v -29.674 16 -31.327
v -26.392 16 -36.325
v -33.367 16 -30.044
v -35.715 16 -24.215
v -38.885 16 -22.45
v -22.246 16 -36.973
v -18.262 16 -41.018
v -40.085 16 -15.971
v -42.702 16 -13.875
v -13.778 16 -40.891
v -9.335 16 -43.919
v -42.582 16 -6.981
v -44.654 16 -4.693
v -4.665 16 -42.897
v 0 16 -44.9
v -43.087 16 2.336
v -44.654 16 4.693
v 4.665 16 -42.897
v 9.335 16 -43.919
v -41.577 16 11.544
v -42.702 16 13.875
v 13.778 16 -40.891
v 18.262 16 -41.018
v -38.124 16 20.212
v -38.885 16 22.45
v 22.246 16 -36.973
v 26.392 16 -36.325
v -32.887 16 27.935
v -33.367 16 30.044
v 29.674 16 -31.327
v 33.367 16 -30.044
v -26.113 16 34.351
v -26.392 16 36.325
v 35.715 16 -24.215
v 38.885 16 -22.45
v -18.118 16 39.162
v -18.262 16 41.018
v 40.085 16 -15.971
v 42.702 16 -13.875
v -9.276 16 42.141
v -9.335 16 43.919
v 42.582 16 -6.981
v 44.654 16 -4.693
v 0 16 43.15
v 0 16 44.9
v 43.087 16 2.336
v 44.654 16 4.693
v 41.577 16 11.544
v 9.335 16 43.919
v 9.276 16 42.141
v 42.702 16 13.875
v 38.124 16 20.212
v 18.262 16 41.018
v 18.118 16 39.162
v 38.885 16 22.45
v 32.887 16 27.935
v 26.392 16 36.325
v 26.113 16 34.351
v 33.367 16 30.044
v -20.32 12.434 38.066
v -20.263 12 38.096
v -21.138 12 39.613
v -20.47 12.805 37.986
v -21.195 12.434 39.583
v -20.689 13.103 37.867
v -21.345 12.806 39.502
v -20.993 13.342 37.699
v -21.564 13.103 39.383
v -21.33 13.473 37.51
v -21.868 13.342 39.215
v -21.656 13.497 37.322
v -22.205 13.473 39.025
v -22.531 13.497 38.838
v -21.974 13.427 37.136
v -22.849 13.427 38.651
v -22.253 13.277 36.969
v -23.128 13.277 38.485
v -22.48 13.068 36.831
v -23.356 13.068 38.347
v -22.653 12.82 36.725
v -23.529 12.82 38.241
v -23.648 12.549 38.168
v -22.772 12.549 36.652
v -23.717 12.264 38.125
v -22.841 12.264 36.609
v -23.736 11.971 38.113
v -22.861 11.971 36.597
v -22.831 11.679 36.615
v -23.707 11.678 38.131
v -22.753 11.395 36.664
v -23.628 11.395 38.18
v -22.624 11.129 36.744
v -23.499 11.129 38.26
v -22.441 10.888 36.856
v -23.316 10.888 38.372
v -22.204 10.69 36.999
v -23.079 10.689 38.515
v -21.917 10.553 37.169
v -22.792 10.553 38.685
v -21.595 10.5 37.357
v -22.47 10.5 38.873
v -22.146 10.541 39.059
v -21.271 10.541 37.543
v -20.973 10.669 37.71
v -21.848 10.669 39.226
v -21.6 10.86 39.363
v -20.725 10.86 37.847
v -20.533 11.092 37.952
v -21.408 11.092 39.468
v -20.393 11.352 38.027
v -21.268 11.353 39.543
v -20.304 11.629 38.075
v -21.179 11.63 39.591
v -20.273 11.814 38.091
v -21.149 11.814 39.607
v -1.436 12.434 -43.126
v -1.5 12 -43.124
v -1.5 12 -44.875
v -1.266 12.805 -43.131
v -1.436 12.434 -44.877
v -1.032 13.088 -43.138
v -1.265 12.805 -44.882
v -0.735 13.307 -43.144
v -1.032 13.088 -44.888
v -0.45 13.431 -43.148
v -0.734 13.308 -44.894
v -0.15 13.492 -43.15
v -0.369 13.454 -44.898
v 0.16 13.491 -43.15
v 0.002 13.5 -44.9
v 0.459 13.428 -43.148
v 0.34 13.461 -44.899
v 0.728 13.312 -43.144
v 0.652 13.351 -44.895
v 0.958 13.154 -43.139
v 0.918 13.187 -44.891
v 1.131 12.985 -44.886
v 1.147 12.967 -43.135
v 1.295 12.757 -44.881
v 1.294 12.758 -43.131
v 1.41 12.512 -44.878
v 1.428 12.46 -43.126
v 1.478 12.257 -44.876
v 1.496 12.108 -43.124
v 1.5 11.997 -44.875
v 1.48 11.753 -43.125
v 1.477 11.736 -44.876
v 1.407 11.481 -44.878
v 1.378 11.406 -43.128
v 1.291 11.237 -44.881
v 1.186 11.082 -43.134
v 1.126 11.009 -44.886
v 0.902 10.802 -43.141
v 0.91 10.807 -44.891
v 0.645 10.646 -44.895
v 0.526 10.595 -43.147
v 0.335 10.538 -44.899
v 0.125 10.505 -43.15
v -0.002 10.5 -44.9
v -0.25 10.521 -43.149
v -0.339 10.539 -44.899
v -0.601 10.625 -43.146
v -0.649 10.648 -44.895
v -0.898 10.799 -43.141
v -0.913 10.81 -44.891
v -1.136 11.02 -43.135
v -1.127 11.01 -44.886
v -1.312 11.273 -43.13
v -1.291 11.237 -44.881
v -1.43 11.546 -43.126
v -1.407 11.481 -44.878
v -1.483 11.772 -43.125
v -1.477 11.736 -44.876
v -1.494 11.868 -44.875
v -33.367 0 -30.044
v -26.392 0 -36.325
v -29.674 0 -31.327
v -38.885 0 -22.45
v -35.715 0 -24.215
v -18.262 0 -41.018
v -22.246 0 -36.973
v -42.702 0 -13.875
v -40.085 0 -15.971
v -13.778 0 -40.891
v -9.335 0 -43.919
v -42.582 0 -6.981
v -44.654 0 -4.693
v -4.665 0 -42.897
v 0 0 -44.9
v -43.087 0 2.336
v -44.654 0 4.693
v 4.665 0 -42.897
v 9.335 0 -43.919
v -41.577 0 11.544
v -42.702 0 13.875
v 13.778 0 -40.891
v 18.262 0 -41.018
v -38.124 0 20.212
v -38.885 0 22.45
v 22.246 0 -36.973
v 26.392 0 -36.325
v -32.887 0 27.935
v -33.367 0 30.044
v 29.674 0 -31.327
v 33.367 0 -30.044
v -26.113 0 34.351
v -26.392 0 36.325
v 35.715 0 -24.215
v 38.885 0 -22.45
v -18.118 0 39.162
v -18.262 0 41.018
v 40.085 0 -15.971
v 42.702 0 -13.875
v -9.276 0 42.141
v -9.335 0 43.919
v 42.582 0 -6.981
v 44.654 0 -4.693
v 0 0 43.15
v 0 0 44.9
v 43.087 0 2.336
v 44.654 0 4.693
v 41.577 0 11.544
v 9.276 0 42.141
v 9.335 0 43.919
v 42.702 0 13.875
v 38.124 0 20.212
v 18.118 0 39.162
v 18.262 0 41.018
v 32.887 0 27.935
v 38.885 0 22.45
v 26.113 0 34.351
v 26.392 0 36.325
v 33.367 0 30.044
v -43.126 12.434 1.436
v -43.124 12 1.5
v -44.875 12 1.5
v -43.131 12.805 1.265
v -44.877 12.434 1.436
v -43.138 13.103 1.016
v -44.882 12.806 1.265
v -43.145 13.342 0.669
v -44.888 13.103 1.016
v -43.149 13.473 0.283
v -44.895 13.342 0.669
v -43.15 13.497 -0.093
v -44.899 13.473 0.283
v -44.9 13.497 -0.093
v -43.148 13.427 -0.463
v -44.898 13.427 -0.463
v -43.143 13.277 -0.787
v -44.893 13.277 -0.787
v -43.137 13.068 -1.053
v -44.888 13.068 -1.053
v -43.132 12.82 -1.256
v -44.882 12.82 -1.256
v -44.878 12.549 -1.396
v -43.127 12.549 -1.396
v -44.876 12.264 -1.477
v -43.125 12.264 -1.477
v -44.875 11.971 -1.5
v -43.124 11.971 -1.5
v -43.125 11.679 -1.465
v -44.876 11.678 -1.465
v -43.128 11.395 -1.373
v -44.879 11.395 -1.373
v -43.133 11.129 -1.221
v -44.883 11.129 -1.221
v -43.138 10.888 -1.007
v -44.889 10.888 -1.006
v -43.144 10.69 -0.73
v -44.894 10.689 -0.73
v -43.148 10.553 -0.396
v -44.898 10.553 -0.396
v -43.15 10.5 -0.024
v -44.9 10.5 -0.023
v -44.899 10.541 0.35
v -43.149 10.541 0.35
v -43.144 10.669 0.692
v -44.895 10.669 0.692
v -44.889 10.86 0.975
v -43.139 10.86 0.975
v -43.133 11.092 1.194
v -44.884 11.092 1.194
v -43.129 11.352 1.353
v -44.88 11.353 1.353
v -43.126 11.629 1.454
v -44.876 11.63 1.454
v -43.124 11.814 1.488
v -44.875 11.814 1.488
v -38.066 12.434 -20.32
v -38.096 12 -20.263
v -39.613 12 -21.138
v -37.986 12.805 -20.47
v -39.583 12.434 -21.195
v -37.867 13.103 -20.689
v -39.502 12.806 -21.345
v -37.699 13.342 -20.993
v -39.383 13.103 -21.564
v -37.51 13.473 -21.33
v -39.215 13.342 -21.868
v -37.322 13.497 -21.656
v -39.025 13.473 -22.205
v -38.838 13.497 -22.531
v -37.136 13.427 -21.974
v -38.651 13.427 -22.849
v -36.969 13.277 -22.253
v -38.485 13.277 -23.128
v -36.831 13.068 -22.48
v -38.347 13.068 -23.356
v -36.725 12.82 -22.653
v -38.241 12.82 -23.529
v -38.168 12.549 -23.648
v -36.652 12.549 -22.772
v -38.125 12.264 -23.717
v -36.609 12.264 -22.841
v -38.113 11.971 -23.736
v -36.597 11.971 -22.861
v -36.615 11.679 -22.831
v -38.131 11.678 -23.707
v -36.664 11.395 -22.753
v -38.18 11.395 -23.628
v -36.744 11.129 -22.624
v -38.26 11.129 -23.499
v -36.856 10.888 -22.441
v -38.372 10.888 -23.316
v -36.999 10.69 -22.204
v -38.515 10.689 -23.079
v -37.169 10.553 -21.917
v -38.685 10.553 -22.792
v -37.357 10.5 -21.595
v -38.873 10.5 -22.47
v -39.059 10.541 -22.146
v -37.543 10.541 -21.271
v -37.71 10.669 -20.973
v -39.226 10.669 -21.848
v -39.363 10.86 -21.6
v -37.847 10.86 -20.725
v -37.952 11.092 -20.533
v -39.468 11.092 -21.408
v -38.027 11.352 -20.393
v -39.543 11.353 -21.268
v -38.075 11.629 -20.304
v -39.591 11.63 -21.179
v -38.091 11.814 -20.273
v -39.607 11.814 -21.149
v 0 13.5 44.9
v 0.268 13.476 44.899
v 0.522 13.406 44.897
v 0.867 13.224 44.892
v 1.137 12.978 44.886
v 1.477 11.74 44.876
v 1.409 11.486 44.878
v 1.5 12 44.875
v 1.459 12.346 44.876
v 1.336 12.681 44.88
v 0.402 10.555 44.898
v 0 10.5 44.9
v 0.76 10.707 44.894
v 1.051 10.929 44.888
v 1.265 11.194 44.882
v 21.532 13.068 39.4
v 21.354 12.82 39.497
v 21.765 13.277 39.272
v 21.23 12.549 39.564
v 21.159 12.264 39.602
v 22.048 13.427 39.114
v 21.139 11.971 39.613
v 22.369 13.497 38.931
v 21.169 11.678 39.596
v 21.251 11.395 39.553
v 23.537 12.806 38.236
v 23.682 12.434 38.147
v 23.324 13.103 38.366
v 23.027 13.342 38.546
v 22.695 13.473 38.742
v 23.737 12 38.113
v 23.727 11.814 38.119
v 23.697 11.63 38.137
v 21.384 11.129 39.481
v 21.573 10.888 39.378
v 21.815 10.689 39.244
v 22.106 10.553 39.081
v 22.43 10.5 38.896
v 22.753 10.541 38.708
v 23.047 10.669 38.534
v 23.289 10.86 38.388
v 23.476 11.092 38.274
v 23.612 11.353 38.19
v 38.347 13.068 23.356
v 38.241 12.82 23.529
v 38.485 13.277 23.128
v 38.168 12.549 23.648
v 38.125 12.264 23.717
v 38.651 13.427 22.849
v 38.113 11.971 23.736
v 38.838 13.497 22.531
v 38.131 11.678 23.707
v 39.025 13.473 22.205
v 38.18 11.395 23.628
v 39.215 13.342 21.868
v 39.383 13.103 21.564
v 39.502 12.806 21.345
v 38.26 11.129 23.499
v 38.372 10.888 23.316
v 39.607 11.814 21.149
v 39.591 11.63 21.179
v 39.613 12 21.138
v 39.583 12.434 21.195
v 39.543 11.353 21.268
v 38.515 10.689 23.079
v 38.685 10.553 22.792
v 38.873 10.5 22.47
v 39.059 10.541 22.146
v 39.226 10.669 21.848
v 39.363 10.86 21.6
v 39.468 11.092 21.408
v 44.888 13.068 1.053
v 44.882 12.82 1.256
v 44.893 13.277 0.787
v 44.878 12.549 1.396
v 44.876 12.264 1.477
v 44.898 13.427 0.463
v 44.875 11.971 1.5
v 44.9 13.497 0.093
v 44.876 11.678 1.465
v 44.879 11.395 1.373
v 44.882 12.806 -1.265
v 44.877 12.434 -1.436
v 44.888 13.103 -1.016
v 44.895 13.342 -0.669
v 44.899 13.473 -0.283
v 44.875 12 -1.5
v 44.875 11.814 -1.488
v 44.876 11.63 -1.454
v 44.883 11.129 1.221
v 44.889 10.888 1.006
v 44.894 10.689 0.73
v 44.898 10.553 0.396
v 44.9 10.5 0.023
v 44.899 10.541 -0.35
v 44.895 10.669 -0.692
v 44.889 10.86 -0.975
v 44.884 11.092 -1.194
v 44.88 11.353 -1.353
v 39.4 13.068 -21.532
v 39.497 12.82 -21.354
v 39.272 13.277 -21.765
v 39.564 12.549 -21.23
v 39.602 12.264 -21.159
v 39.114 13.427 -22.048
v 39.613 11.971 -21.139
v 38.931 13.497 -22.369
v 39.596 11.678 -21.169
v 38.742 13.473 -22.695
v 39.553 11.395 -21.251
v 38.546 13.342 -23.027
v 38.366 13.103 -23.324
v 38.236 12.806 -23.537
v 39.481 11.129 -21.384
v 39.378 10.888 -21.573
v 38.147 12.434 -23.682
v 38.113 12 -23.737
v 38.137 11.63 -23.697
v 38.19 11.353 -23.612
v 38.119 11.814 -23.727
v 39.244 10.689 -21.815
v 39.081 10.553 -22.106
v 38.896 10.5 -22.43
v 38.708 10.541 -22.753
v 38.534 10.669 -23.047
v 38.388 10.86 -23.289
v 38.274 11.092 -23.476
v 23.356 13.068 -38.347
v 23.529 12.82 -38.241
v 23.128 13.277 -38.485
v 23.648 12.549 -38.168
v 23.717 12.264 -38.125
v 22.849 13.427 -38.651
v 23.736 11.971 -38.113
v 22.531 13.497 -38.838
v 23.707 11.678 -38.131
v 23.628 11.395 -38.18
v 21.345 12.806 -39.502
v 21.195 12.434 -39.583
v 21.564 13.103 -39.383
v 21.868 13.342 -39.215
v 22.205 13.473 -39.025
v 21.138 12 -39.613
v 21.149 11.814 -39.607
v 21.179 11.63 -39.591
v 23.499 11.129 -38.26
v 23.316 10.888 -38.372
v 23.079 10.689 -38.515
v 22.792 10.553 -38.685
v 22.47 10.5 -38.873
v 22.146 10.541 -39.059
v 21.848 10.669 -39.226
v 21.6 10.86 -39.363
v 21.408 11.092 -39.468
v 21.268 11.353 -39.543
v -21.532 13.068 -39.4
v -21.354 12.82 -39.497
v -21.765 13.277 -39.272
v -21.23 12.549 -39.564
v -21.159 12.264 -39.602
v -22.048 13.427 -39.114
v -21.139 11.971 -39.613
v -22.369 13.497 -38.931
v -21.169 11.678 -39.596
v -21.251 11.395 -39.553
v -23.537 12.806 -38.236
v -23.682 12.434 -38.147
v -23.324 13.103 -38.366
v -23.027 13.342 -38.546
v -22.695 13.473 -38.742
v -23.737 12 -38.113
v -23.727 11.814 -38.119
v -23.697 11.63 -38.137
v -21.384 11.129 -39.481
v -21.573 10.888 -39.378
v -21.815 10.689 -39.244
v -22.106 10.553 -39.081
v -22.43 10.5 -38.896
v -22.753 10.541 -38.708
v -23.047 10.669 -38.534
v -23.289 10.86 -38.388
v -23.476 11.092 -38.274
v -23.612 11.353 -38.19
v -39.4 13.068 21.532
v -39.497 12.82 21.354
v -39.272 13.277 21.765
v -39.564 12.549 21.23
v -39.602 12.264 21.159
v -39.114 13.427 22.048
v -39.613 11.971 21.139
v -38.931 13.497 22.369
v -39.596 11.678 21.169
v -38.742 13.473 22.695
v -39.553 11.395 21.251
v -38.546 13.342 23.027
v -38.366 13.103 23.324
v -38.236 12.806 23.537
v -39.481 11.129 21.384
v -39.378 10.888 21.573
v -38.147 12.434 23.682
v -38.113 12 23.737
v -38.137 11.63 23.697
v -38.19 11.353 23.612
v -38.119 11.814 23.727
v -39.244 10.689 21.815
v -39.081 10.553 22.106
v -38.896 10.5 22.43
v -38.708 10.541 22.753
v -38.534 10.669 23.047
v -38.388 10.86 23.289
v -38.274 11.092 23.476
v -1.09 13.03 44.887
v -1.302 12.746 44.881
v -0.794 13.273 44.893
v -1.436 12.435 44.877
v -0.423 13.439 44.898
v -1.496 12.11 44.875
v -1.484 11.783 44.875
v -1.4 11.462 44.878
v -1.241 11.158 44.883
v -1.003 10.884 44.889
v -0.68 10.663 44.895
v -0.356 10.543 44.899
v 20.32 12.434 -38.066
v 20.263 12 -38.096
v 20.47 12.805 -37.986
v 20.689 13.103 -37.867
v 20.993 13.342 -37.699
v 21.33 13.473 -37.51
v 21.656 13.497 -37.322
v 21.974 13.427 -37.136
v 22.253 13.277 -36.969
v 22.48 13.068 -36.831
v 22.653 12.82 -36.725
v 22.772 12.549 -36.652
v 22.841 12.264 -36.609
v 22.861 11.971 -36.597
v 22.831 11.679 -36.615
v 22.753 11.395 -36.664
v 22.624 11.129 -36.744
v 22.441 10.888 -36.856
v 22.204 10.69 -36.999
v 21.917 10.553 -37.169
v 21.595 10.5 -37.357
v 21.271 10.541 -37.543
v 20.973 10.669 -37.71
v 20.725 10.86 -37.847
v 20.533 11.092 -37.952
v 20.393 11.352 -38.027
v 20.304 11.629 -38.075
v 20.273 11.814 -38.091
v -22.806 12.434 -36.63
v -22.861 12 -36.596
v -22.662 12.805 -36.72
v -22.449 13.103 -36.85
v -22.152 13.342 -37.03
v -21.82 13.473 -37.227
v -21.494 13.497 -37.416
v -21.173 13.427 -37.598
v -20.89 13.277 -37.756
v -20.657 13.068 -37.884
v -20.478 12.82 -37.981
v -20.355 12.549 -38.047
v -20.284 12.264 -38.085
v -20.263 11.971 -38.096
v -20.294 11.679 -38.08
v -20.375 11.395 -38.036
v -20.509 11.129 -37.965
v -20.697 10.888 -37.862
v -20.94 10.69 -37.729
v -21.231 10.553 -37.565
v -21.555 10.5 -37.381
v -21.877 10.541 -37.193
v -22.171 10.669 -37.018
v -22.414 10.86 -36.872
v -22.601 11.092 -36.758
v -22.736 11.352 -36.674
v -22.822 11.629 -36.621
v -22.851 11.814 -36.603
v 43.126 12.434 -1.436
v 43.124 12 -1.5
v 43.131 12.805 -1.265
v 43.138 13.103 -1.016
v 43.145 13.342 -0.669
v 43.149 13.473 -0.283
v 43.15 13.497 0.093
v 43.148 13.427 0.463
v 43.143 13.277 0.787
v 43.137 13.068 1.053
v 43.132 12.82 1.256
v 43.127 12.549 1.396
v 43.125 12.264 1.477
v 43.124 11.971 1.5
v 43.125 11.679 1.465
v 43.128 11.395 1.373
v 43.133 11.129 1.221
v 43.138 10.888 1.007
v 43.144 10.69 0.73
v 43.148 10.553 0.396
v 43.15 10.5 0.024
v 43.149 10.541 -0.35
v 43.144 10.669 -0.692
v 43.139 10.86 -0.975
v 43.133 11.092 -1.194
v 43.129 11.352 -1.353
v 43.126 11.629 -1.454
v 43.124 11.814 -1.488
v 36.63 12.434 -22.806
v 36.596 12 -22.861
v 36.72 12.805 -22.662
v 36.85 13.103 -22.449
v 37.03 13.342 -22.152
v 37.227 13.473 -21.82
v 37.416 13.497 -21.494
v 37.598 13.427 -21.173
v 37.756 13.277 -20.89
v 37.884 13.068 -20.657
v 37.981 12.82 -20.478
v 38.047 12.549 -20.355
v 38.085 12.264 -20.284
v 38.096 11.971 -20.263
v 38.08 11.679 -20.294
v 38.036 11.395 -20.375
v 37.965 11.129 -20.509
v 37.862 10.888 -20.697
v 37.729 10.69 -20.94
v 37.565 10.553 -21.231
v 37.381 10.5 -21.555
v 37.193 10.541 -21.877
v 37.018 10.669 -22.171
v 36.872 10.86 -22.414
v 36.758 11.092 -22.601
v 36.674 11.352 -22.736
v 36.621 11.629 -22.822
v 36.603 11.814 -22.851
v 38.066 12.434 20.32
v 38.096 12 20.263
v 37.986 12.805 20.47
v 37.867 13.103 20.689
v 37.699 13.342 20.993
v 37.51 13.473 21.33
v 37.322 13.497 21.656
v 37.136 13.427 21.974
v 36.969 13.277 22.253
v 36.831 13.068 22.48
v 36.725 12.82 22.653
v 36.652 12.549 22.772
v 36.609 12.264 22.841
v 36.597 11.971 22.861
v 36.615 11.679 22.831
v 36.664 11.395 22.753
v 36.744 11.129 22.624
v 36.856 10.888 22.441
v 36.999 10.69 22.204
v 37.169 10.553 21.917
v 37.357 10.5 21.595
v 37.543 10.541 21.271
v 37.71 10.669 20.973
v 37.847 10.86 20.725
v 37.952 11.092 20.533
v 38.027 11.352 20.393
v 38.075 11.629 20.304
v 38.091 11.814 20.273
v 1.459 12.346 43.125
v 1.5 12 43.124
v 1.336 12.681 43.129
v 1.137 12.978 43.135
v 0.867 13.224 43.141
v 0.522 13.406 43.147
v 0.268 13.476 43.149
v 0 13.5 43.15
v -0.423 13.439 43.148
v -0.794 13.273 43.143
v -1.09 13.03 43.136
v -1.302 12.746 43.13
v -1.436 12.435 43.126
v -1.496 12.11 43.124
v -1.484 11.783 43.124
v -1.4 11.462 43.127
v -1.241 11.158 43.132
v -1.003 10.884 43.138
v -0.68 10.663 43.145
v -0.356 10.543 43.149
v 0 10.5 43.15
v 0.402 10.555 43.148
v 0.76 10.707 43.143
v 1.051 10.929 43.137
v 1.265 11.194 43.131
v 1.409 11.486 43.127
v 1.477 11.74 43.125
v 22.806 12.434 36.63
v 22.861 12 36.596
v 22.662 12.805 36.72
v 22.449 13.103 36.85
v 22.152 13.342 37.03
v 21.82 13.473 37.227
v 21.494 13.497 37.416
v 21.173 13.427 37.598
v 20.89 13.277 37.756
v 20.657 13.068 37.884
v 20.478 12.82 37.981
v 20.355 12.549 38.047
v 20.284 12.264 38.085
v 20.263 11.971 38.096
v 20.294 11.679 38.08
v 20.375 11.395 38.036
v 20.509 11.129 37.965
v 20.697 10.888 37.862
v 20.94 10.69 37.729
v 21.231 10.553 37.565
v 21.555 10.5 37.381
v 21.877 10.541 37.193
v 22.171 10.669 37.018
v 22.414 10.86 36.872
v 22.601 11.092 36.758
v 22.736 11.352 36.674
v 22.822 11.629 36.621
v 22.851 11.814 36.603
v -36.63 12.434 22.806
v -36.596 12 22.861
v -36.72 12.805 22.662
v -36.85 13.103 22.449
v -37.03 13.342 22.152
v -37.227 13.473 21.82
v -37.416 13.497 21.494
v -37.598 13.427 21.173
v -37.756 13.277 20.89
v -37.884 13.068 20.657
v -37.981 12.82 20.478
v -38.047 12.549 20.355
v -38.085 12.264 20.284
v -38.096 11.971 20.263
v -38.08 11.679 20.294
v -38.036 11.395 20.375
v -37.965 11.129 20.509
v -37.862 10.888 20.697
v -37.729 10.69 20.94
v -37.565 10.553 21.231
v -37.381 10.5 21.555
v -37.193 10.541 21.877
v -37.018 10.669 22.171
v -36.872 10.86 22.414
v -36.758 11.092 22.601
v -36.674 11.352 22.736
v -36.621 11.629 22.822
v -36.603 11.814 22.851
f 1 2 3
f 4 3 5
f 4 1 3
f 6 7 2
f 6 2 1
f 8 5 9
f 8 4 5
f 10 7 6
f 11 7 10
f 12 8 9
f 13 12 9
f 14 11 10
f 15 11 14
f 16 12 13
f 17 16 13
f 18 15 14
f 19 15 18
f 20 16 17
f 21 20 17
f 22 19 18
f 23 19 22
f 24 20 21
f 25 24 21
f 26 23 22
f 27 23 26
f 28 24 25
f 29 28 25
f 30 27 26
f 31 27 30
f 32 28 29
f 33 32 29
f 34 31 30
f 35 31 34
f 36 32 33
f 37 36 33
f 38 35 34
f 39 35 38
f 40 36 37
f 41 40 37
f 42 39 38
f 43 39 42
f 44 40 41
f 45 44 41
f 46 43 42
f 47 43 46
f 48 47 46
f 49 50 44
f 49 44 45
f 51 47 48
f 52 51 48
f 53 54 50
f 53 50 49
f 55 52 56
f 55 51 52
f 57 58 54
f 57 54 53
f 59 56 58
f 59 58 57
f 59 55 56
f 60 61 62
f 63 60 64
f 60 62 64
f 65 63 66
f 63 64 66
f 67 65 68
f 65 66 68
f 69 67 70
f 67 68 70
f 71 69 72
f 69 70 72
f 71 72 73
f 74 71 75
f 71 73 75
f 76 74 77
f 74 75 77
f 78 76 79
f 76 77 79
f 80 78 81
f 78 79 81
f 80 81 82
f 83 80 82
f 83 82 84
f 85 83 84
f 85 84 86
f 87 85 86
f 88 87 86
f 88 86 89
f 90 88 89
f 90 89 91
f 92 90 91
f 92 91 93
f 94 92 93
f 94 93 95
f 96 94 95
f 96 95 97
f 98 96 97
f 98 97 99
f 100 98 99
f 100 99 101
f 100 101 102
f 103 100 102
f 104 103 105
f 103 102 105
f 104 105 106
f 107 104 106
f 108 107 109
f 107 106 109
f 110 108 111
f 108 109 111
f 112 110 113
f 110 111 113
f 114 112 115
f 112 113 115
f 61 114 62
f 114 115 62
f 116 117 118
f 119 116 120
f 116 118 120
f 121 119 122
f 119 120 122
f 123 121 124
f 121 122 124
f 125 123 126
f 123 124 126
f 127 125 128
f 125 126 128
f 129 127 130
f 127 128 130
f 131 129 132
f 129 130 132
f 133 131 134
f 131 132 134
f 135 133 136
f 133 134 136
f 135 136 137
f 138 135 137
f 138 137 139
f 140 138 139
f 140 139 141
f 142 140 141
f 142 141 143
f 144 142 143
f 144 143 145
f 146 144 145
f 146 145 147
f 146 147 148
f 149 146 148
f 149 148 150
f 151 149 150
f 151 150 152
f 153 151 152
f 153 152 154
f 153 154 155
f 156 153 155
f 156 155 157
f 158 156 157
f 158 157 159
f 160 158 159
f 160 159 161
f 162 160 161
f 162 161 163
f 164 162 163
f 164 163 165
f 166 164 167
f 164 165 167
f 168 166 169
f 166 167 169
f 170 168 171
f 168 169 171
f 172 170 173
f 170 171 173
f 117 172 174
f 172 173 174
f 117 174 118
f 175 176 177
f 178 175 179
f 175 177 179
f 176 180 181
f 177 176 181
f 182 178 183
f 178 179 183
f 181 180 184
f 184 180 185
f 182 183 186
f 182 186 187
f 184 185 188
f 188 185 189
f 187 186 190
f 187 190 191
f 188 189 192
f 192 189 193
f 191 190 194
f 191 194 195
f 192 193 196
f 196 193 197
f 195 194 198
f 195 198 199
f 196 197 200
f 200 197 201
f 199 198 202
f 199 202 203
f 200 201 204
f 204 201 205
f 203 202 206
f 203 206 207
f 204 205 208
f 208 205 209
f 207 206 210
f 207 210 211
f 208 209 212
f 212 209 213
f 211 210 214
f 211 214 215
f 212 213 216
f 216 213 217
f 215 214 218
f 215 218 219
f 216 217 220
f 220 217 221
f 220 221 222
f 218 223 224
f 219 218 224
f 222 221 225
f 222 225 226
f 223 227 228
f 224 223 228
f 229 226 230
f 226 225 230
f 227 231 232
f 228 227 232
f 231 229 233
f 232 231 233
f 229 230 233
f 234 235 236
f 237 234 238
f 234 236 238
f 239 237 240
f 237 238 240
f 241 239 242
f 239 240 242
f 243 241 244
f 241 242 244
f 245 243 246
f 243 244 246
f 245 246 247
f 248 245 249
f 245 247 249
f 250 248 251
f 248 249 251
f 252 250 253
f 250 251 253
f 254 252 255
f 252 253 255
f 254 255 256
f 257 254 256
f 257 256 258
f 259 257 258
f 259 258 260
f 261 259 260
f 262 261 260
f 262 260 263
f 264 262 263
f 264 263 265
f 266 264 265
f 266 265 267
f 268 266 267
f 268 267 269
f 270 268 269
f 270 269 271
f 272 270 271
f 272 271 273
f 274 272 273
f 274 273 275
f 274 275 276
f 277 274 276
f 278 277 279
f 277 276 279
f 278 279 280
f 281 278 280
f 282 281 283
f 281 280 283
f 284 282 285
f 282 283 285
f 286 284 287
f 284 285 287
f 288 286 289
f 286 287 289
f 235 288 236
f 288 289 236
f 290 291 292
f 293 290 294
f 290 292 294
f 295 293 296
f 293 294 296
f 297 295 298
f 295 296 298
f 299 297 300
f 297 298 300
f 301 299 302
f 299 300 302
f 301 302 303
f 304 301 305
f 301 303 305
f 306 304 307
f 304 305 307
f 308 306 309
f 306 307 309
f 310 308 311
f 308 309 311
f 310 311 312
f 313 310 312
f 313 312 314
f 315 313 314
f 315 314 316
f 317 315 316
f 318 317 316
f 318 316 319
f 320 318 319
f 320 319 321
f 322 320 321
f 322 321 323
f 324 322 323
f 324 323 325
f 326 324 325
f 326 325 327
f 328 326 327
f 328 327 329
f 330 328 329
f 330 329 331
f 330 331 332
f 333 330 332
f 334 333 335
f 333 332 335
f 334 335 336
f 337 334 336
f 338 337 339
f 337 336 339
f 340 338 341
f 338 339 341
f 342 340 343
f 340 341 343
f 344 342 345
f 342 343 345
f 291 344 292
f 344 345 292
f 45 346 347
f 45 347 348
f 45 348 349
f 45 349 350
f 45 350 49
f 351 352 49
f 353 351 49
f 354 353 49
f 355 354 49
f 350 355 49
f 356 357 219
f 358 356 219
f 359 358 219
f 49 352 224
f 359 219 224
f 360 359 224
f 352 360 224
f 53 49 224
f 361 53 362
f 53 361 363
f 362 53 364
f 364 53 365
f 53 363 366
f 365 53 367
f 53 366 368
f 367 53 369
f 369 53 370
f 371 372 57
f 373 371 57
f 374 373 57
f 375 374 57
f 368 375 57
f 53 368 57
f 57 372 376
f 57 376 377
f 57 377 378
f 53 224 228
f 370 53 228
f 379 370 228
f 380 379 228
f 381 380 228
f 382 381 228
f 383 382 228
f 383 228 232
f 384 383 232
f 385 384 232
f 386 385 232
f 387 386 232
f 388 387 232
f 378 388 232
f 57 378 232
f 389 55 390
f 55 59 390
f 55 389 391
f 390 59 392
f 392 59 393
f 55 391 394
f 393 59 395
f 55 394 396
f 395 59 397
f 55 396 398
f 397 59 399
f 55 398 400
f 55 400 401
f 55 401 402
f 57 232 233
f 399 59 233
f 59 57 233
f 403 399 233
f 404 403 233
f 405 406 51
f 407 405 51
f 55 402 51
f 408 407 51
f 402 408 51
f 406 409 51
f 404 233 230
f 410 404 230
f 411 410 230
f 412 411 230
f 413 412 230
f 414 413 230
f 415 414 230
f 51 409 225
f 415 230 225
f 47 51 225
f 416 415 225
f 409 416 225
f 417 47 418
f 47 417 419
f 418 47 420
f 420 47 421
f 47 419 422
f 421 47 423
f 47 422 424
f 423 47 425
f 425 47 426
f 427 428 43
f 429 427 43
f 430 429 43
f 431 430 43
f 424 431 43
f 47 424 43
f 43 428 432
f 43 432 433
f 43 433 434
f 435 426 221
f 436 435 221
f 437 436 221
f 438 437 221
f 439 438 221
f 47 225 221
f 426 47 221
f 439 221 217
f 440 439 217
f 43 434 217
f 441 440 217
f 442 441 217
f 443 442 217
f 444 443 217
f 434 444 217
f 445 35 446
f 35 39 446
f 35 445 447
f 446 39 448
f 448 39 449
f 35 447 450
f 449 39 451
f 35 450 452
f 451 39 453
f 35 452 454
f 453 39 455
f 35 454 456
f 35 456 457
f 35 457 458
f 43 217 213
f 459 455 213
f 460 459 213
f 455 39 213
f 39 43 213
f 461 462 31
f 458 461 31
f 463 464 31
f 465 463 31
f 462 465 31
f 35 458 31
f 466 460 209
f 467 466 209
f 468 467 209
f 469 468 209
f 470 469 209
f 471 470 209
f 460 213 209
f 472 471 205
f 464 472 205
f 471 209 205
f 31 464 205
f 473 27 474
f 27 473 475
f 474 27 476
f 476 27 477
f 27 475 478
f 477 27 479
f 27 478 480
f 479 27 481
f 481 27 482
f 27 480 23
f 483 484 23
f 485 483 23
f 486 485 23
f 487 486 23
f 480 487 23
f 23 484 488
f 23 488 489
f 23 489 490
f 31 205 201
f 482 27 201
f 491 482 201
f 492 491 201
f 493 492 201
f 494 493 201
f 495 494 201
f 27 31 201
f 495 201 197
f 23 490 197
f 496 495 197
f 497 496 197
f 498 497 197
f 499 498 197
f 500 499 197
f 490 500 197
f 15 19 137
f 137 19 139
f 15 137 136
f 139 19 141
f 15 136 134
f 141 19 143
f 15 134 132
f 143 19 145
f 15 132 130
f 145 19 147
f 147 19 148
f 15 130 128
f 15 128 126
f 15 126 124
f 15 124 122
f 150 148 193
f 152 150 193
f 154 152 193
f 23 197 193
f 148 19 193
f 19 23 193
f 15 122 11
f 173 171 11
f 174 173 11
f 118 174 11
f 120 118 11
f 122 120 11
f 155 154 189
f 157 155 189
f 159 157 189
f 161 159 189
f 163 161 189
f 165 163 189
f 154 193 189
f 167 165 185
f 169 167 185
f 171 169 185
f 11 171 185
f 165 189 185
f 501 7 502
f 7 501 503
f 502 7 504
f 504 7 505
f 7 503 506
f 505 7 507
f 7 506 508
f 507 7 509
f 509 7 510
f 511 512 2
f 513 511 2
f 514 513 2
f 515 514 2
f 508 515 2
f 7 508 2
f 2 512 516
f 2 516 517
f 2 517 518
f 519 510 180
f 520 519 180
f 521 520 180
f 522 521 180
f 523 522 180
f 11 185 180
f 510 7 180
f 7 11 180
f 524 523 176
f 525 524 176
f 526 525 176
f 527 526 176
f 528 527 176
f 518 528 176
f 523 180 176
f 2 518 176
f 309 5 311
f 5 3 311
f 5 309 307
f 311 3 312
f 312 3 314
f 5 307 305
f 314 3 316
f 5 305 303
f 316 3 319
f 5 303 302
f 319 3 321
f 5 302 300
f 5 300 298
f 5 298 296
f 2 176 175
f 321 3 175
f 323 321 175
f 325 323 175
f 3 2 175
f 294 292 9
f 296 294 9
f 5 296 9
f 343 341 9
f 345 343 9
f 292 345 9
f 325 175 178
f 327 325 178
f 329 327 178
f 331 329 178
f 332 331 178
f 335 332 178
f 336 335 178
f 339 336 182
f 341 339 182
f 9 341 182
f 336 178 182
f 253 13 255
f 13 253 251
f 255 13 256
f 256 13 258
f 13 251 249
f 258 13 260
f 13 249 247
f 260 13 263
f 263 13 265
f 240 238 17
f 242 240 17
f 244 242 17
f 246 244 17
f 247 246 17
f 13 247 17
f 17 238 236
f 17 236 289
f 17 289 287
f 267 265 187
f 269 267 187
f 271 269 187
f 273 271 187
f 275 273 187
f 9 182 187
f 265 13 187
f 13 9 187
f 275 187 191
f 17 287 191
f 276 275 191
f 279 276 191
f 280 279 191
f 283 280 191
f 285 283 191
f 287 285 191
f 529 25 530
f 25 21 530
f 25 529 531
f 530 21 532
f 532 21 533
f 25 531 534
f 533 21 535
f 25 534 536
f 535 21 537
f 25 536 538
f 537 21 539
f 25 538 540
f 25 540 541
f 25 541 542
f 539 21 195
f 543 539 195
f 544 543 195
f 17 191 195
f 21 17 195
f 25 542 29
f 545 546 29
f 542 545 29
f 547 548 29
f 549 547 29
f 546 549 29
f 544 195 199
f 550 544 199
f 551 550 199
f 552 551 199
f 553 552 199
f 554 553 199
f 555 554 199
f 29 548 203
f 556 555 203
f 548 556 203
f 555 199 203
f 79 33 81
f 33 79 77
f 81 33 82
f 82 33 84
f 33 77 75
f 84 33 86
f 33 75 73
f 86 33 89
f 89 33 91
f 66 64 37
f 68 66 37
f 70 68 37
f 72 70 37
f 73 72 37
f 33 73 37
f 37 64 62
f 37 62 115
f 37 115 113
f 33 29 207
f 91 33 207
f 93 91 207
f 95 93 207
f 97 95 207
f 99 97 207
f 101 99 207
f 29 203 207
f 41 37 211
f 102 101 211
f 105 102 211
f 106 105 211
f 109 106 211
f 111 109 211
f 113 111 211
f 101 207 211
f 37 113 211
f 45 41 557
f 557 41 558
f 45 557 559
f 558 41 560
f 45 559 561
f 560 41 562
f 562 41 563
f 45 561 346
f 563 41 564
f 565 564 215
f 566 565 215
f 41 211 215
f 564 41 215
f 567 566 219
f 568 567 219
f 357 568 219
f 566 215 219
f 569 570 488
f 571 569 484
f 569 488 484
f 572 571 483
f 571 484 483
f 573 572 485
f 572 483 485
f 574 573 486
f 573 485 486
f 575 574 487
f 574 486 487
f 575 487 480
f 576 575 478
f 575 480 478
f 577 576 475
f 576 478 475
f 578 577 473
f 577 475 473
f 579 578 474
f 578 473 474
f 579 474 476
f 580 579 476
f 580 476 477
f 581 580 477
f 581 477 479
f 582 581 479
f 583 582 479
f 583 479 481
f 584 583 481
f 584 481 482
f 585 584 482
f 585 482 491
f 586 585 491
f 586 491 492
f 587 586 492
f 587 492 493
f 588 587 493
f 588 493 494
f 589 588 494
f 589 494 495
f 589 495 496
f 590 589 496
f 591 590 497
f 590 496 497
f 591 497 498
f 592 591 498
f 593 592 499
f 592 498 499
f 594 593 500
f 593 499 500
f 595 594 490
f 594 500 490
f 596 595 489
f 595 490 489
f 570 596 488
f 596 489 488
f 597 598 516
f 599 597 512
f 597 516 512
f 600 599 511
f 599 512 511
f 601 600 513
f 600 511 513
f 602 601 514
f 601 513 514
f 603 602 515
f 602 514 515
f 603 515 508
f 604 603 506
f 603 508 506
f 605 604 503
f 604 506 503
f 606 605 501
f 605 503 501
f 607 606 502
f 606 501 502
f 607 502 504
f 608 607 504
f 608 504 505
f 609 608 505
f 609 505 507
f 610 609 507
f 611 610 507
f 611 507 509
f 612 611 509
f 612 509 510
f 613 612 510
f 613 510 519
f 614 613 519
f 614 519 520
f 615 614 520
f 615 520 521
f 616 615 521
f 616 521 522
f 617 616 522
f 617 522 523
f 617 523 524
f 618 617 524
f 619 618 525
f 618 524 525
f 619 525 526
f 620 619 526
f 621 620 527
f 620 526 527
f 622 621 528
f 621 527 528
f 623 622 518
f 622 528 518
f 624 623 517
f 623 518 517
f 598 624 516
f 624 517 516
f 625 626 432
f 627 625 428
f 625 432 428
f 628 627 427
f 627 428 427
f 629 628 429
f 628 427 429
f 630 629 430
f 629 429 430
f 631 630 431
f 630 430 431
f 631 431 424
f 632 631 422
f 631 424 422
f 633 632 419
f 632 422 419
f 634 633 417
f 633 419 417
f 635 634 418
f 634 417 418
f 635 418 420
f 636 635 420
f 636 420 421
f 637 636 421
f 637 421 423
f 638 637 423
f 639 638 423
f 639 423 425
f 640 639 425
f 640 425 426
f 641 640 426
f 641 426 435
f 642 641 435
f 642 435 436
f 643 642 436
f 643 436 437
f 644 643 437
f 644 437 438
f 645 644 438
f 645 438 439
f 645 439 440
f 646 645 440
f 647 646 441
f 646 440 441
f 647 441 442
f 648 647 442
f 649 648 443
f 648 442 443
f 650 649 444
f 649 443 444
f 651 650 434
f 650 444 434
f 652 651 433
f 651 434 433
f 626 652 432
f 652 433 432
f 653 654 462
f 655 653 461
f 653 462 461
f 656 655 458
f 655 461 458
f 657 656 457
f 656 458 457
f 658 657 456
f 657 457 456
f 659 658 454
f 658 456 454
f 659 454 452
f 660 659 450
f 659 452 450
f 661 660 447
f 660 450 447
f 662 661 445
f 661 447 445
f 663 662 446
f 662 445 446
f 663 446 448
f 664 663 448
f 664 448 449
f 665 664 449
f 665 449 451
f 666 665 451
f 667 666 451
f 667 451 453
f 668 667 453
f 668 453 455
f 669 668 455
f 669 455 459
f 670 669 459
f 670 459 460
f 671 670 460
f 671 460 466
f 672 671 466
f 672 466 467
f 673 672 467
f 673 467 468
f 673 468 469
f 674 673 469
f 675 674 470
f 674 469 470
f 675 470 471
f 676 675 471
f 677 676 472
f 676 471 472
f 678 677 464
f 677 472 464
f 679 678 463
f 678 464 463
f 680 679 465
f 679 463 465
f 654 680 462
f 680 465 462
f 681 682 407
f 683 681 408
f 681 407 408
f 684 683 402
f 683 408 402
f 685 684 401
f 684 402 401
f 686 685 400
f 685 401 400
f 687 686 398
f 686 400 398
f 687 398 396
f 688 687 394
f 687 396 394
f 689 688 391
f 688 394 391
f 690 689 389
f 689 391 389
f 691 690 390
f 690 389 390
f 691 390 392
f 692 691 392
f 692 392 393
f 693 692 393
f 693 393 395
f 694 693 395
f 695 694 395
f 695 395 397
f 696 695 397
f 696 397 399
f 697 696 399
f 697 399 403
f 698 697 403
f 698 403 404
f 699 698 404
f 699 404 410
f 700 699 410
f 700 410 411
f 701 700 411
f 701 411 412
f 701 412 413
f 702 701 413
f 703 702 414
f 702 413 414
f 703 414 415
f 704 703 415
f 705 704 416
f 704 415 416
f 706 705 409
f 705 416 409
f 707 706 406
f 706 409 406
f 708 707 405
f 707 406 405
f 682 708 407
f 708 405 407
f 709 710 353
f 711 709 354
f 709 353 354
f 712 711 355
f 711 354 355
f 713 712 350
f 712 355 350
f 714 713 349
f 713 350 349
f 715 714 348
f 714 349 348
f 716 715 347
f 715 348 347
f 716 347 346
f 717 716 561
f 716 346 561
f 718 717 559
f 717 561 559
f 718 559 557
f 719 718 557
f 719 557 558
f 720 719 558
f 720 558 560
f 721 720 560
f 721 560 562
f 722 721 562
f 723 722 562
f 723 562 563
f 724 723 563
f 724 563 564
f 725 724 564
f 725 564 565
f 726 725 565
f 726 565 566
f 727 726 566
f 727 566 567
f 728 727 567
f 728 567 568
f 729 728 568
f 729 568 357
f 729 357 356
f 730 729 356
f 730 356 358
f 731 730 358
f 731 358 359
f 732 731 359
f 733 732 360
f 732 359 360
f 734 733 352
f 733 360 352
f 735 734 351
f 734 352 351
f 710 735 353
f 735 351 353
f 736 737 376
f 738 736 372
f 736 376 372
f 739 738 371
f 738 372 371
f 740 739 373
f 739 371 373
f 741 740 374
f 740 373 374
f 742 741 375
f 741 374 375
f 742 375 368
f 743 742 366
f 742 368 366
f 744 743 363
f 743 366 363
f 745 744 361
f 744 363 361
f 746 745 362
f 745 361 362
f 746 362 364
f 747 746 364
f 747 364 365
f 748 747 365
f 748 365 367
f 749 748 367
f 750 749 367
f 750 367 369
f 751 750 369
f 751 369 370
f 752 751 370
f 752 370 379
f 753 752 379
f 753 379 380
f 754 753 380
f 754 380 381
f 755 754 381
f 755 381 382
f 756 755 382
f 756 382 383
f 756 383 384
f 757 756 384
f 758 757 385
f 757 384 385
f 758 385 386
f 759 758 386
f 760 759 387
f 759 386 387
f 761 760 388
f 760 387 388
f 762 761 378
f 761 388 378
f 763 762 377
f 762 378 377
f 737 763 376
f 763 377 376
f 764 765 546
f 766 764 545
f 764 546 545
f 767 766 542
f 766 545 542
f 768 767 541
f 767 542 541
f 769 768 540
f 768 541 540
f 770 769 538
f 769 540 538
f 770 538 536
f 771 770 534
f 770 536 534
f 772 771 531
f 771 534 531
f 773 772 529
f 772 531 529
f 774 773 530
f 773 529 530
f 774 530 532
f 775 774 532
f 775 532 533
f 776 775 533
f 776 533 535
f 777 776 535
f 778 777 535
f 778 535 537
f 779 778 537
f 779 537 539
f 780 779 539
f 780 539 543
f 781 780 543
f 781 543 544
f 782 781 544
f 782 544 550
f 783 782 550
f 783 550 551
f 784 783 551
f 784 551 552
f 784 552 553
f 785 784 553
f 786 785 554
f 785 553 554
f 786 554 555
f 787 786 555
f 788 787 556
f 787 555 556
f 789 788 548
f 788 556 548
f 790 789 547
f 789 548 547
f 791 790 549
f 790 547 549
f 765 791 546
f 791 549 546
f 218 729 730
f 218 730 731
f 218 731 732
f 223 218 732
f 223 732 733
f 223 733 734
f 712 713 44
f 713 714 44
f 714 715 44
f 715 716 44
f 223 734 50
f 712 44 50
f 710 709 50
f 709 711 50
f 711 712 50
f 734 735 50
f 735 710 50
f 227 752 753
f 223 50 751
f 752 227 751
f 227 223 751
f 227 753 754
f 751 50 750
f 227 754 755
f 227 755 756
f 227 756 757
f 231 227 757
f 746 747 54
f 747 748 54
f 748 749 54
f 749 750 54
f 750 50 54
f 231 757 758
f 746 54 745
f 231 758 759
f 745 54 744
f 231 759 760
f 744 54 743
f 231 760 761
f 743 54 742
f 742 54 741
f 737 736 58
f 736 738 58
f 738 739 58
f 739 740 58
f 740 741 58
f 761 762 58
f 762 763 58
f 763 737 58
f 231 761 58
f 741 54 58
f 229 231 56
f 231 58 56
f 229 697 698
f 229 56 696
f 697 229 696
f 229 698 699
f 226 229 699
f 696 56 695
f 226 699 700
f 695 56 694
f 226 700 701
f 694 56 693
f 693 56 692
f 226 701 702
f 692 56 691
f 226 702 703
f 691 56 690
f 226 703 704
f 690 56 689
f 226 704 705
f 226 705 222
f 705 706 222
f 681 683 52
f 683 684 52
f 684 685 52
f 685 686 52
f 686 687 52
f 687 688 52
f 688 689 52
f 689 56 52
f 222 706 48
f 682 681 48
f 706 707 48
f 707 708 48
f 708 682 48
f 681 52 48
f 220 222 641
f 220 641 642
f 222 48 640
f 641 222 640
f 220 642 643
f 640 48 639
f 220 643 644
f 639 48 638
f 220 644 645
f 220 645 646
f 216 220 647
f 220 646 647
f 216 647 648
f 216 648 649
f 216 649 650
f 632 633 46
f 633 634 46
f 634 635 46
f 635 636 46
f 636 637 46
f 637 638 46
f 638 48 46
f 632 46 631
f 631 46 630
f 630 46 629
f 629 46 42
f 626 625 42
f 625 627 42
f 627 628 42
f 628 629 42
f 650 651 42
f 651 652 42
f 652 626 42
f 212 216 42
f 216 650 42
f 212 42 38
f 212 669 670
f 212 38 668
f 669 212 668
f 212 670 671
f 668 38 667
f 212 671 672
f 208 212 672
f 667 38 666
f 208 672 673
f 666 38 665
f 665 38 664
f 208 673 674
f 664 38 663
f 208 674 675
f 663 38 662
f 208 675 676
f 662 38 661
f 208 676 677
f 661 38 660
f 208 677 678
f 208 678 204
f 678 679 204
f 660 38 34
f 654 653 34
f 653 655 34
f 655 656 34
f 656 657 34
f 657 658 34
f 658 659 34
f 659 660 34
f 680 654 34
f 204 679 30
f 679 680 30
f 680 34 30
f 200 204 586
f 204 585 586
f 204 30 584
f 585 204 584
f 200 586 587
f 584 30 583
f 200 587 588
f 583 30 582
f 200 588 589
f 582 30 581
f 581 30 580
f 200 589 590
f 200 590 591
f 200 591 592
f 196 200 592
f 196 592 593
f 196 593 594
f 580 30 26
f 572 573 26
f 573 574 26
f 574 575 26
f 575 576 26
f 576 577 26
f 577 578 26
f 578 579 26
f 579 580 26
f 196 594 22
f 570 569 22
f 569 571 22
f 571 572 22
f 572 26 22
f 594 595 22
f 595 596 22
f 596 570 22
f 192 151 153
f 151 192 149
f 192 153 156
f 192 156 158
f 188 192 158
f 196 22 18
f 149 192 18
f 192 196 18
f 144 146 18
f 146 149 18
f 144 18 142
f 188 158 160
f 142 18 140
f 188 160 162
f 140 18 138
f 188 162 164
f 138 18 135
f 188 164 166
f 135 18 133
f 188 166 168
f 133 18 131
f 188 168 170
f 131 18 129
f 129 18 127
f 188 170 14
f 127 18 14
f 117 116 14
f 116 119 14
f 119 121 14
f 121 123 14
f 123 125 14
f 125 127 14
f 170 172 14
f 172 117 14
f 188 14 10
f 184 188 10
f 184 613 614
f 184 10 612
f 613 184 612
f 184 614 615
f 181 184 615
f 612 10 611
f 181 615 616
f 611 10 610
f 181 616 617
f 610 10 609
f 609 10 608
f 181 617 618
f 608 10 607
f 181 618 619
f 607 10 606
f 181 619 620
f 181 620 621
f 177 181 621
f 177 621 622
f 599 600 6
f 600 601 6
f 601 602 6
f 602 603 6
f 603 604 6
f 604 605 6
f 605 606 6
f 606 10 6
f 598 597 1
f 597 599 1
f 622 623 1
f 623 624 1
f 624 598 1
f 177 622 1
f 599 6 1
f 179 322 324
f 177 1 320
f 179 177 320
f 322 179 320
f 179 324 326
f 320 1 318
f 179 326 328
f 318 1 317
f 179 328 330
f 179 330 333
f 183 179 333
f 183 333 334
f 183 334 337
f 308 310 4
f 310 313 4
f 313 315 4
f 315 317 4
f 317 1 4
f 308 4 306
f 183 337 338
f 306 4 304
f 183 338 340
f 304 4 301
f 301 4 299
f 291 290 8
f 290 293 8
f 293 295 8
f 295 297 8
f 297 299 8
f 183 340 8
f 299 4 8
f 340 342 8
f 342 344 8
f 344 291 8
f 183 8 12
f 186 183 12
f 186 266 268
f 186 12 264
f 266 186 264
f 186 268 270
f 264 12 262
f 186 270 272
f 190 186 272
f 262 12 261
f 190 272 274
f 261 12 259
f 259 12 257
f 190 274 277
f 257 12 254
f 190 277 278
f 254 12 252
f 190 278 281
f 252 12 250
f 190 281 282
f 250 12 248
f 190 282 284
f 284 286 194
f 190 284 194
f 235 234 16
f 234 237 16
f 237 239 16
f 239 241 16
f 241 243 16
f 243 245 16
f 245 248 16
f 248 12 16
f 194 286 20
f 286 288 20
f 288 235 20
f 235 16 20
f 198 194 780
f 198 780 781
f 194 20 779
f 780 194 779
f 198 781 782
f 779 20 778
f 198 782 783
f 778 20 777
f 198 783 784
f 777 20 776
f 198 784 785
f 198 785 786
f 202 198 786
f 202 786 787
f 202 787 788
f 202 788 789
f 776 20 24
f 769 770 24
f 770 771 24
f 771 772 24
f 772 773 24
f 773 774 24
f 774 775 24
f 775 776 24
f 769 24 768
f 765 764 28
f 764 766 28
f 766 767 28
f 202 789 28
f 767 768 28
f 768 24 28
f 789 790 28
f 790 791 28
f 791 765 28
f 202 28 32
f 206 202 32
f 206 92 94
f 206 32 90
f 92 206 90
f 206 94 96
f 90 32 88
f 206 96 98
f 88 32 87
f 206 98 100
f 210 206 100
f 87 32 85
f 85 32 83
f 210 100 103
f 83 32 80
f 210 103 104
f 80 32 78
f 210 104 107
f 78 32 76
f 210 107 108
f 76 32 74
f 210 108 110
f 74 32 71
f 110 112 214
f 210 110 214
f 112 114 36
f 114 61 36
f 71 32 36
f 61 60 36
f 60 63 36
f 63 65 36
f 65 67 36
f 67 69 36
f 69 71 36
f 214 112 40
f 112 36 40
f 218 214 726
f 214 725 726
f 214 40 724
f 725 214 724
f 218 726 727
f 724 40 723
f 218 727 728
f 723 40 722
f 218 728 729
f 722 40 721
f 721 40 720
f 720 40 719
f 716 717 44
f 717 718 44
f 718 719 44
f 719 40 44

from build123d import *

# Parameters (mm, degrees)
SKETCH_1_R               = 44.9
SKETCH_1_R_2             = 2.5
SKETCH_1_R_3             = 18.4
EXTRUDE_1_DEPTH          = 16
SKETCH_2_R               = 4
CUT_EXTRUDE_1_DEPTH      = 3
SKETCH_4_R               = 4.5
CUT_EXTRUDE_2_DEPTH      = 5.1
SKETCH_5_R               = 1.5
CUT_EXTRUDE_3_DEPTH      = 10
PATTERN_CIRCULAR_1_COUNT = 12
FILLET_1_R               = 0.5
SKETCH1_R                = 43.15
CUT_EXTRUDE1_DEPTH       = 66.482975056


with BuildPart() as part:
    # 草图1 → 凸台-拉伸1 (new body)
    with BuildSketch(Plane(origin=(0, 0, 0), x_dir=(1, 0, 0), z_dir=(0, 1, 0))):
        with Locations(Location((0, 0, 0), (0, 0, 270))):
            Circle(SKETCH_1_R)
        with Locations(Location((-24.6, 0, 0), (0, 0, 270))):
            Circle(SKETCH_1_R_2, mode=Mode.SUBTRACT)
        with Locations(Location((-12.3, 21.304224933, 0), (0, 0, 270))):
            Circle(SKETCH_1_R_2, mode=Mode.SUBTRACT)
        with Locations(Location((12.3, 21.304224933, 0), (0, 0, 270))):
            Circle(SKETCH_1_R_2, mode=Mode.SUBTRACT)
        with Locations(Location((24.6, 0, 0), (0, 0, 270))):
            Circle(SKETCH_1_R_2, mode=Mode.SUBTRACT)
        with Locations(Location((12.3, -21.304224933, 0), (0, 0, 270))):
            Circle(SKETCH_1_R_2, mode=Mode.SUBTRACT)
        with Locations(Location((-12.3, -21.304224933, 0), (0, 0, 270))):
            Circle(SKETCH_1_R_2, mode=Mode.SUBTRACT)
        with Locations(Location((0, 0, 0), (0, 0, 270))):
            Circle(SKETCH_1_R_3, mode=Mode.SUBTRACT)
    extrude(amount=EXTRUDE_1_DEPTH)

    # 草图2 → 切除-拉伸1 (cut)
    with BuildSketch(Plane.XZ):
        with Locations(Location((-21.304224933, -12.3, 0), (0, 0, 270))):
            Circle(SKETCH_2_R)
        with Locations(Location((0, 24.6, 0), (0, 0, 270))):
            Circle(SKETCH_2_R)
        with Locations(Location((21.304224933, -12.3, 0), (0, 0, 270))):
            Circle(SKETCH_2_R)
    extrude(amount=-CUT_EXTRUDE_1_DEPTH, mode=Mode.SUBTRACT)

    # 草图4 → 切除-拉伸2 (cut)
    with BuildSketch(Plane(origin=(0, 16, 0), x_dir=(1, 0, 0), z_dir=(0, 1, 0))):
        with Locations(Location((-24.6, 0, 0), (0, 0, 270))):
            Circle(SKETCH_4_R)
        with Locations(Location((-12.3, 21.304224933, 0), (0, 0, 270))):
            Circle(SKETCH_4_R)
        with Locations(Location((12.3, 21.304224933, 0), (0, 0, 270))):
            Circle(SKETCH_4_R)
        with Locations(Location((24.6, 0, 0), (0, 0, 270))):
            Circle(SKETCH_4_R)
        with Locations(Location((12.3, -21.304224933, 0), (0, 0, 270))):
            Circle(SKETCH_4_R)
        with Locations(Location((-12.3, -21.304224933, 0), (0, 0, 270))):
            Circle(SKETCH_4_R)
    extrude(amount=-CUT_EXTRUDE_2_DEPTH, mode=Mode.SUBTRACT)

    # 草图5 → 切除-拉伸3 (cut)
    with BuildSketch(Plane(origin=(45, 0, 0), x_dir=(0, 0, -1), z_dir=(1, 0, 0))):
        with Locations((0, 12)):
            Circle(SKETCH_5_R)
    cut_extrude_3 = extrude(amount=-CUT_EXTRUDE_3_DEPTH, mode=Mode.SUBTRACT)

    # 阵列(圆周)1: 切除-拉伸3 ×12 about axis
    pattern_circular_1_axis = Axis((0, 0, 0), (0, 1, 0))
    for i in range(1, PATTERN_CIRCULAR_1_COUNT):
        add(cut_extrude_3.rotate(pattern_circular_1_axis, i * 360 / PATTERN_CIRCULAR_1_COUNT), mode=Mode.SUBTRACT)

    # 圆角1
    fillet_1_edges = [part.edges().sort_by_distance(p)[0] for p in [
        (0, 16, -18.4),
    ]]
    fillet(fillet_1_edges, radius=FILLET_1_R)

    # Sketch1 → Cut-Extrude1 (cut, through all)
    with BuildSketch(Plane(origin=(0, 16, 0), x_dir=(1, 0, 0), z_dir=(0, 1, 0))):
        with Locations(Location((0, 0, 0), (0, 0, 270))):
            Circle(SKETCH1_R)
    extrude(amount=-CUT_EXTRUDE1_DEPTH, mode=Mode.SUBTRACT)


solid = part.part
